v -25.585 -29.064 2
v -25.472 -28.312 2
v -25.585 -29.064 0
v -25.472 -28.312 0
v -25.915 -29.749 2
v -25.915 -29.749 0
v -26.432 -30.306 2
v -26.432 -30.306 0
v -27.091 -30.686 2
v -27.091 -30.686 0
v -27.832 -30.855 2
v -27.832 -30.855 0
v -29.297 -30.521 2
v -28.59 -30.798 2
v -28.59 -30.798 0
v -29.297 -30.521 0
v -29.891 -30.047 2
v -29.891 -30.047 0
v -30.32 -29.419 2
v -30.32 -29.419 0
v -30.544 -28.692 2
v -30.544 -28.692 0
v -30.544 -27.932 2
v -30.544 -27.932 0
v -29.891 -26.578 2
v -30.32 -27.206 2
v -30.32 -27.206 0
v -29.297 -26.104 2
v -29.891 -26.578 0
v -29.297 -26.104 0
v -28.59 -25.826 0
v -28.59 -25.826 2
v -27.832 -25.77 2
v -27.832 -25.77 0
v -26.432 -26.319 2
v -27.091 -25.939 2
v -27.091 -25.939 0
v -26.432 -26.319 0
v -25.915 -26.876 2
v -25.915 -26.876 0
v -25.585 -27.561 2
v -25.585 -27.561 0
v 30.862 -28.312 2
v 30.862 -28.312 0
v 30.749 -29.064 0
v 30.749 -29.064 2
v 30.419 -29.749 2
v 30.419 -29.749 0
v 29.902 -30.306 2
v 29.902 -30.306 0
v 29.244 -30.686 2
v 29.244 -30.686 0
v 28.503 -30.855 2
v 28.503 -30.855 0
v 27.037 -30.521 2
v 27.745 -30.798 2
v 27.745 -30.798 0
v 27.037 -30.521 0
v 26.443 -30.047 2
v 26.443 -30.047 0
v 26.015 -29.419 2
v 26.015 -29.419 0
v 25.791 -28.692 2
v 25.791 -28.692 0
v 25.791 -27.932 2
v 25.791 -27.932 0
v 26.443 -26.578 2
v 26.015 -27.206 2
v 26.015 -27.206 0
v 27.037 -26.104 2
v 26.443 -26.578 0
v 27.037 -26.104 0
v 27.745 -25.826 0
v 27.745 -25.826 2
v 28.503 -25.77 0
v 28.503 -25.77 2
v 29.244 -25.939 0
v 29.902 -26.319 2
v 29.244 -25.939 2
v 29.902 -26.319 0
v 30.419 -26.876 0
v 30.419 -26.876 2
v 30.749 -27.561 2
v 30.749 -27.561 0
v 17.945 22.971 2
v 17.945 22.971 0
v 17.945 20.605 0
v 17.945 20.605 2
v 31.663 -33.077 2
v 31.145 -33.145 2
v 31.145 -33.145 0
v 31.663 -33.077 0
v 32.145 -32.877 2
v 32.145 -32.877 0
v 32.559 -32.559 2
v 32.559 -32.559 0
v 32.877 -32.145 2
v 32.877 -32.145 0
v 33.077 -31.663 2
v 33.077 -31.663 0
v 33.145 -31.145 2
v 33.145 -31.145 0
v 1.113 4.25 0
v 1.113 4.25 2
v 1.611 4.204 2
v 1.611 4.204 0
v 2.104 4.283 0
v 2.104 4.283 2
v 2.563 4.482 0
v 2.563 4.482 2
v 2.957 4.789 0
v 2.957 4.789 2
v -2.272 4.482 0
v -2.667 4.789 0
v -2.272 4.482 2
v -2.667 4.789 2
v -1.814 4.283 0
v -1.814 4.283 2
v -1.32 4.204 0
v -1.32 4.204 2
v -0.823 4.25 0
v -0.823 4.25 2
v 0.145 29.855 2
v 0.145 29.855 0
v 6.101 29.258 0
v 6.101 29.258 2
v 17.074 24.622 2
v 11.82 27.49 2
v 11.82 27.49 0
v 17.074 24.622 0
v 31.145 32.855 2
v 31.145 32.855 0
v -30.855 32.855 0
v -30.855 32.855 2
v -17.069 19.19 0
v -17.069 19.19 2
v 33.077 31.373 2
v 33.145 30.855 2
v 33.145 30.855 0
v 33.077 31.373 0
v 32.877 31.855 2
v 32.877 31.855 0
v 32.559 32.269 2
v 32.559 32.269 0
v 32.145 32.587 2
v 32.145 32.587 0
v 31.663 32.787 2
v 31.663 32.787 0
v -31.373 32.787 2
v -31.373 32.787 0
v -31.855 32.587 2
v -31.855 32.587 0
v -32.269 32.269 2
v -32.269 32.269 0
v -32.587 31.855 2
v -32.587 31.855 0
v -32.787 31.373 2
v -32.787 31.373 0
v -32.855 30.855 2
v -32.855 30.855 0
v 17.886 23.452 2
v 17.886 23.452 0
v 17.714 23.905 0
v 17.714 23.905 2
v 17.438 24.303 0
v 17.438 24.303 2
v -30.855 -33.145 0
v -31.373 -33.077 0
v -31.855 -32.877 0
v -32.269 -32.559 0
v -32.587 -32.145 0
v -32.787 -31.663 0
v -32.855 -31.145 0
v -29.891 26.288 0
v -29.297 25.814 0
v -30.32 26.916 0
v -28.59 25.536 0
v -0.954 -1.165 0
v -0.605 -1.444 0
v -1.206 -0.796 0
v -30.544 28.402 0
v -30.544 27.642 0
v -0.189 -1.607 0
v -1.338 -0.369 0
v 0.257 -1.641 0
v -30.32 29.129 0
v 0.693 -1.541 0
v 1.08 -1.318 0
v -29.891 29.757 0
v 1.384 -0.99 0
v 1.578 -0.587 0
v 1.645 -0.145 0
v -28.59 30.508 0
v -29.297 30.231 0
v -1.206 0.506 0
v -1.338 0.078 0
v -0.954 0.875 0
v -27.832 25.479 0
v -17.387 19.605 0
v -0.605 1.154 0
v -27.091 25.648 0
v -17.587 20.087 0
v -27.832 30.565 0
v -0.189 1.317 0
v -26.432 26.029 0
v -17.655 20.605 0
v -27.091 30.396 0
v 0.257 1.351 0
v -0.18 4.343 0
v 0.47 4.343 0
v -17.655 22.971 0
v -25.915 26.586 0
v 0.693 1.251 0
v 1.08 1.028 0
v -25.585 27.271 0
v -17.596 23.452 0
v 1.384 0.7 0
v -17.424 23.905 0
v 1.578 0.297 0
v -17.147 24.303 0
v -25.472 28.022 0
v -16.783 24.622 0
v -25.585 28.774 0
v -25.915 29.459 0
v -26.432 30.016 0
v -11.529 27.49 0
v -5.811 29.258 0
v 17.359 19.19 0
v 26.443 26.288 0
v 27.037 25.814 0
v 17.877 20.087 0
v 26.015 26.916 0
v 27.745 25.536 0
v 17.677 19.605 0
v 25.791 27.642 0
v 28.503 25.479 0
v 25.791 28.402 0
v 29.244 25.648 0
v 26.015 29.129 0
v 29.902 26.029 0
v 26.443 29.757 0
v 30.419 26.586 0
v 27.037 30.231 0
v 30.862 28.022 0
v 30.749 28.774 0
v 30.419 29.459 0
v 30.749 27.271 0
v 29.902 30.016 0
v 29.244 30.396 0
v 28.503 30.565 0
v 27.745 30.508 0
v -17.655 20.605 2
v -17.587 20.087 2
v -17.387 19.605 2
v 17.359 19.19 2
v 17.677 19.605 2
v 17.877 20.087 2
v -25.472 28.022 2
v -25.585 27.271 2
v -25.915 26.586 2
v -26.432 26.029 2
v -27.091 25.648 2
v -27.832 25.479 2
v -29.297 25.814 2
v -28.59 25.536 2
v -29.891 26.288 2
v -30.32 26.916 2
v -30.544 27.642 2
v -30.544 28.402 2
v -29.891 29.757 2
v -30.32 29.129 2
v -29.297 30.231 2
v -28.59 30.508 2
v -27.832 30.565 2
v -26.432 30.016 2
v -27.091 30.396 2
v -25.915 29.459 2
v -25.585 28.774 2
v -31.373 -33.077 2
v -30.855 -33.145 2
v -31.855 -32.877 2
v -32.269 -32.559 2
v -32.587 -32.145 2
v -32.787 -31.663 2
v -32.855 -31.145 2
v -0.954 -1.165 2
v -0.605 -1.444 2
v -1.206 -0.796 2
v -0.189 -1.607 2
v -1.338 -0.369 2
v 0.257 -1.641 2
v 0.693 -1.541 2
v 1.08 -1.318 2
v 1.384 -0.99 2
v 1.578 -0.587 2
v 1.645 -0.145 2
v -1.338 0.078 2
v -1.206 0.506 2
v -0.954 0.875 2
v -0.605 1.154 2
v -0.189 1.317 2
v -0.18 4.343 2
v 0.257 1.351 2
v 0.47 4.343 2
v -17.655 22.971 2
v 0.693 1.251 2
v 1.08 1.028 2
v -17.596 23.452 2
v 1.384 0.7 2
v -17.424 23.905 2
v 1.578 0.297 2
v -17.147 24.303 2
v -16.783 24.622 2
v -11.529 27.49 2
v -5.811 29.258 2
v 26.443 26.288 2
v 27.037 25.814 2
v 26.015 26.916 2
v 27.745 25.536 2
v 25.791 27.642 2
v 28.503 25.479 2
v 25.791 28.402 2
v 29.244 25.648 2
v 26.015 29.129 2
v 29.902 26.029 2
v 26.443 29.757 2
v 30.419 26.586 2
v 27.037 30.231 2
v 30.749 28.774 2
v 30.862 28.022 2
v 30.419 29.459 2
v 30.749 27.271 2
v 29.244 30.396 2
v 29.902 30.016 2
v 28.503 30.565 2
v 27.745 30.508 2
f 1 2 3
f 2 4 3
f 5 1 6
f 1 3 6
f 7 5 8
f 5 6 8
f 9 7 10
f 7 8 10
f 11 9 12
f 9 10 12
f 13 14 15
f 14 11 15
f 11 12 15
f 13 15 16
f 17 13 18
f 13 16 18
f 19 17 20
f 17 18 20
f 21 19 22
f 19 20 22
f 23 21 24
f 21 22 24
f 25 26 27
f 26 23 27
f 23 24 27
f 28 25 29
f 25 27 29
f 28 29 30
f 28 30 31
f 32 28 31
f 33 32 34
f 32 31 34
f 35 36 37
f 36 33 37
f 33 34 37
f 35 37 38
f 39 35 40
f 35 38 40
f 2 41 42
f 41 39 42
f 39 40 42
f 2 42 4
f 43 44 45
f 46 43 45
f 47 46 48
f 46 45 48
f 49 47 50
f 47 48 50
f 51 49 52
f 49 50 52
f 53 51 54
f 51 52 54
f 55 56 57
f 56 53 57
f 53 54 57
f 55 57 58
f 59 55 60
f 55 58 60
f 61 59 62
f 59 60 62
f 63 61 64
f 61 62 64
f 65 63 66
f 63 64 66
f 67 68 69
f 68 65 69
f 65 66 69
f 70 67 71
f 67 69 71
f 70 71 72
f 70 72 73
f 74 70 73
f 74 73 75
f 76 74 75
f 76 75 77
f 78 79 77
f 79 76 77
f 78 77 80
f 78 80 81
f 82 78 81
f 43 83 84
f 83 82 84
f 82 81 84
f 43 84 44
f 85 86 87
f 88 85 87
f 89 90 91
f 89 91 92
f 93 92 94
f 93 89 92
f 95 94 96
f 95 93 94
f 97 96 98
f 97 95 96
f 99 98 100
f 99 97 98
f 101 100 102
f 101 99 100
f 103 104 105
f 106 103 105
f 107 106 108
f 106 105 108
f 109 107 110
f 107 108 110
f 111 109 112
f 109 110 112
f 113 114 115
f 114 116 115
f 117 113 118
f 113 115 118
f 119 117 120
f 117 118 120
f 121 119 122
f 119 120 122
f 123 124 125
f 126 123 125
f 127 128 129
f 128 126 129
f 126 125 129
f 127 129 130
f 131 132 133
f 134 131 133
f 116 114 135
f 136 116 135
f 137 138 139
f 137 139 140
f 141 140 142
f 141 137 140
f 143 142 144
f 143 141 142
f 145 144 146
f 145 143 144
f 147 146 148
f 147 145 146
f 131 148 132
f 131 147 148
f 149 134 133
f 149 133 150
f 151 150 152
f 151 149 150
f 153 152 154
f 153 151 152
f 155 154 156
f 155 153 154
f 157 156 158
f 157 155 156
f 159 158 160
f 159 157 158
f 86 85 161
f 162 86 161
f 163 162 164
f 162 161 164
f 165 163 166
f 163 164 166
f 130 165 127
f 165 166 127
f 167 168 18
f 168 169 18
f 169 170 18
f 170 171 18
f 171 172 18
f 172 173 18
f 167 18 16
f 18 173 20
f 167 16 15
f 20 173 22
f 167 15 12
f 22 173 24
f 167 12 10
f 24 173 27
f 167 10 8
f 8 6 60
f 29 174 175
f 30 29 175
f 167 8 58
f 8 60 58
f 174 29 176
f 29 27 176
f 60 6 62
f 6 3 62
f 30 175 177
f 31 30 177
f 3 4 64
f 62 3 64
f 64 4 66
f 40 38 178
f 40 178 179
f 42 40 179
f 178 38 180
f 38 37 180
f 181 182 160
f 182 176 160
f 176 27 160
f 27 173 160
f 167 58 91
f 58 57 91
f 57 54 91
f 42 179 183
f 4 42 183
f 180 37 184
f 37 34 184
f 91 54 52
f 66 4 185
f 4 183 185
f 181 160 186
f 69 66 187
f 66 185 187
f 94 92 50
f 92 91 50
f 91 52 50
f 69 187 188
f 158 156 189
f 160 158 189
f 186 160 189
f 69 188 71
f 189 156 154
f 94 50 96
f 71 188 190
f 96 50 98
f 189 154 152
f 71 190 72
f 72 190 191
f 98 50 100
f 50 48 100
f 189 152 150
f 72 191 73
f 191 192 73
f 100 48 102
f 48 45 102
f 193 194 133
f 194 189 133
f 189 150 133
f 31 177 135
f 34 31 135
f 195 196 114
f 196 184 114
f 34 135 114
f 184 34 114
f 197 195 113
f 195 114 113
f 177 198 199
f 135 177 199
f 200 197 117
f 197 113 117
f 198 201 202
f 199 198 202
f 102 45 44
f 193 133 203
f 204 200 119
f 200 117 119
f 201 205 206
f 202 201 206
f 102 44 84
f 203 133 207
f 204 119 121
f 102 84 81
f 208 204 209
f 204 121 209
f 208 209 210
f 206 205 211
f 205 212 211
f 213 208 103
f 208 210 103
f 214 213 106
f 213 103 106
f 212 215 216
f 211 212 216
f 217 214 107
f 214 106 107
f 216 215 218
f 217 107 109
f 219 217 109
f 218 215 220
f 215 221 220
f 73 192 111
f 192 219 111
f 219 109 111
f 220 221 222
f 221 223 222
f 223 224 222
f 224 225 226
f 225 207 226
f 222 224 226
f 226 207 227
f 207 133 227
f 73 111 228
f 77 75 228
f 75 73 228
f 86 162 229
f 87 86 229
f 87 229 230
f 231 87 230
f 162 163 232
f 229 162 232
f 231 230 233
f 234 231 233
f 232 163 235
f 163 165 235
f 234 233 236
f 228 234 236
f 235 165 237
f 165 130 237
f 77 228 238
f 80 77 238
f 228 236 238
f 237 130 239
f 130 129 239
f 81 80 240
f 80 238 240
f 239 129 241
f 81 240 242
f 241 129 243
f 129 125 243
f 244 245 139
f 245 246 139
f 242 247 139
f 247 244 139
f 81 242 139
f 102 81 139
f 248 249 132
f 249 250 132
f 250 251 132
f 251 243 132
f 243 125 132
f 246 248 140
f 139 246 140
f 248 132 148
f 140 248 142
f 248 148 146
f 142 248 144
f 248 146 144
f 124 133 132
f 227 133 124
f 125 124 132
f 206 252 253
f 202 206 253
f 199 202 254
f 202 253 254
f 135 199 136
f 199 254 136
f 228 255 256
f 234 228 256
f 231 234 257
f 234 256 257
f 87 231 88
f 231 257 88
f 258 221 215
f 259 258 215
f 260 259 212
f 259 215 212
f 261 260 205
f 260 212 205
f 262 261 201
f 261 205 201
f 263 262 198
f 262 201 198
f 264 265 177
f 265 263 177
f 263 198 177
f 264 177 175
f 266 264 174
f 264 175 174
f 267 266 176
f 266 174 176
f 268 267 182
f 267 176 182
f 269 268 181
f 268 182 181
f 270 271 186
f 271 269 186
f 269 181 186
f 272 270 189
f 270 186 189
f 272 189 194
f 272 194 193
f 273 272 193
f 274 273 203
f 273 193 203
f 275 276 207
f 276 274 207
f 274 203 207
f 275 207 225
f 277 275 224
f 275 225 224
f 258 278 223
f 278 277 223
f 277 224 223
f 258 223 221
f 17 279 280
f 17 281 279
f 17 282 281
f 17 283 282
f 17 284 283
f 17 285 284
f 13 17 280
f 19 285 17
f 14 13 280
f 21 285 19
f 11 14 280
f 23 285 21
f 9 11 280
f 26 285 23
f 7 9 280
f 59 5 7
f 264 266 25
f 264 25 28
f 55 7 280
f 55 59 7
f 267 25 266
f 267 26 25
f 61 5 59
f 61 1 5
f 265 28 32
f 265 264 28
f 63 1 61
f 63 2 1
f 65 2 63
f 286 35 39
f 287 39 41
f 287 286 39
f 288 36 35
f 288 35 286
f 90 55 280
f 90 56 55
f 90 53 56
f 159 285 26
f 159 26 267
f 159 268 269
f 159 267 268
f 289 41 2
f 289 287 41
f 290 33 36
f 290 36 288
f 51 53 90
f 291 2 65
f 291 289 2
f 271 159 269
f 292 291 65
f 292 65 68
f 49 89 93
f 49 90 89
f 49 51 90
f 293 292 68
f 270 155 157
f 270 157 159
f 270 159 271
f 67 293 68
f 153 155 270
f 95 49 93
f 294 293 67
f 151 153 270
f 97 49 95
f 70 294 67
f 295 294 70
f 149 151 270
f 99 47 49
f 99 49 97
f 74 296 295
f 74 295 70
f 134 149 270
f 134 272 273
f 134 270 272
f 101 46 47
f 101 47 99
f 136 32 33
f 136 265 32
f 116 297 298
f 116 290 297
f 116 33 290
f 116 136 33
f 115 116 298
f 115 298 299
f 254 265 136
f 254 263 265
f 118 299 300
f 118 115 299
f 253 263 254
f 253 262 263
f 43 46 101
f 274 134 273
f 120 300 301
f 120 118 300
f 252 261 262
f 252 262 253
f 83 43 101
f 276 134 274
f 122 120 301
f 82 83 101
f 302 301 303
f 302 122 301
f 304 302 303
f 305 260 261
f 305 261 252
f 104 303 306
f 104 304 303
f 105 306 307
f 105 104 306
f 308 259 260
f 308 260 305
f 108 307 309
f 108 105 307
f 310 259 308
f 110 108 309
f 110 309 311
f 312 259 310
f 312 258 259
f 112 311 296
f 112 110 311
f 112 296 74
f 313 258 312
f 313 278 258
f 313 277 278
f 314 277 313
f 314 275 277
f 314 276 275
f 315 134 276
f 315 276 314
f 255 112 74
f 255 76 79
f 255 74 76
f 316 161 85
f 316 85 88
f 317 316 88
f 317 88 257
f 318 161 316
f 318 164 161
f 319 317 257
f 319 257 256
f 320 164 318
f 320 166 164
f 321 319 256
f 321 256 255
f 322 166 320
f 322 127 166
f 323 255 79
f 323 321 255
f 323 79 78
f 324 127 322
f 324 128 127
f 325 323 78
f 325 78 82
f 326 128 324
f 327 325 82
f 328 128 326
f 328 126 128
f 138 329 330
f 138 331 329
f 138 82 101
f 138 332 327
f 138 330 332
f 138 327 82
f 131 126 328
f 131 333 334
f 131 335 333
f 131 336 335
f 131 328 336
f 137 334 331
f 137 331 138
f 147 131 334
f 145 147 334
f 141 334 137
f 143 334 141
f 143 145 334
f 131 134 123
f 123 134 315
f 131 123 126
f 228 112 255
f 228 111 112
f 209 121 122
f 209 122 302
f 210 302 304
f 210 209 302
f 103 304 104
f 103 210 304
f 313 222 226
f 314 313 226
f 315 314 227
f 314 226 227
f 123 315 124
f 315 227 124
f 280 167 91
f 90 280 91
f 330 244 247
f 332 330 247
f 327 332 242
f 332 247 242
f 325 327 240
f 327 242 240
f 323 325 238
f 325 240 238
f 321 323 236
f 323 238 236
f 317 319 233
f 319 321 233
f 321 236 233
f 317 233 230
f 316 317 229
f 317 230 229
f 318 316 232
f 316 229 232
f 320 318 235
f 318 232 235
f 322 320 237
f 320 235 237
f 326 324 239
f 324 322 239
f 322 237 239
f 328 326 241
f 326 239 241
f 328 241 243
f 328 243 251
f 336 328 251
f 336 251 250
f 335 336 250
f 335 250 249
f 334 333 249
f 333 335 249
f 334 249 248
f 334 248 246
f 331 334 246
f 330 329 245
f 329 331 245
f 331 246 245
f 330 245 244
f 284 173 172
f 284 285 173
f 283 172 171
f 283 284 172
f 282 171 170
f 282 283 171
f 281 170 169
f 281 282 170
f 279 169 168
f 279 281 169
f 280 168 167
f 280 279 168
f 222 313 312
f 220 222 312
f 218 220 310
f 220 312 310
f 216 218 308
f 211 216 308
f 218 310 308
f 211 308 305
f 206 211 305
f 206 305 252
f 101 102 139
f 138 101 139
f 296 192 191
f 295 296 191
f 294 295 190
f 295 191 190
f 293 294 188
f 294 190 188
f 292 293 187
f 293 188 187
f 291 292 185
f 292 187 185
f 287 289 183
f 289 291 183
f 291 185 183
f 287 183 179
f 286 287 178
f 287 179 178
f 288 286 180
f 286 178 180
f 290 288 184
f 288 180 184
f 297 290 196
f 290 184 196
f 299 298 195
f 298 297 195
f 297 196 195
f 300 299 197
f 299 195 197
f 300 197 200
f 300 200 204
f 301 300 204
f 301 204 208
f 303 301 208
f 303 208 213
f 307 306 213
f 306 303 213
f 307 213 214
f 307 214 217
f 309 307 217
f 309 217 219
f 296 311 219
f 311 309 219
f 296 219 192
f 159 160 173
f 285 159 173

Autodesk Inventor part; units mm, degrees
ref_plane "YZ Plane" through (0, 0, 0) normal (1, 0, 0) x (0, 1, 0)
ref_plane "XZ Plane" through (0, 0, 0) normal (0, 1, 0) x (-1, 0, 0)
ref_plane "XY Plane" through (0, 0, 0) normal (0, 0, 1) x (1, 0, 0)
sketch "Sketch1" plane through (0.1451, -0.1451, 0) normal (0, 0, 1) x (1, 0, 0)
  arc A0 (20.126, -22.2473) -> (-20.126, -22.2473) centre (0, 0) ccw construction
  circle A1 centre (0, 0) radius 33 construction
  line L0 (33, 33) -> (-33, 33)
  line L1 (-33, 33) -> (-33, -33)
  line L2 (-33, -33) -> (33, -33)
  line L3 (33, -33) -> (33, 33)
  line L4 (33, 33) -> (23.3345, 23.3345) construction
  line L5 (-33, 33) -> (-23.3345, 23.3345) construction
  line L6 (23.3345, 23.3345) -> (-23.3345, -23.3345) construction
  line L7 (23.3345, -23.3345) -> (33, -33) construction
  line L8 (-23.3345, -23.3345) -> (-33, -33) construction
  line L9 (-23.3345, 23.3345) -> (23.3345, -23.3345) construction
  line L10 (0, -33) -> (0, 33) construction
  line L11 (33, 0) -> (-33, 0) construction
  circle A2 centre (0, 0) radius 1.5
  circle A3 centre (0, 0) radius 4.5
  line L12 (4.0607, -1.9393) -> (22.2473, -20.126) construction
  line L13 (1.9393, -4.0607) -> (17.8, -19.9213) construction
  arc A4 (0, -30) -> (17.8, -24.1487) centre (0, 0) ccw construction
  line L14 (-1.9393, -4.0607) -> (-17.8, -19.9213) construction
  line L15 (-4.0607, -1.9393) -> (-22.2473, -20.126) construction
  line L16 (23.3345, 23.3345) -> (-23.3345, -23.3345) construction
  arc A5 (-20.126, -22.2473) -> (-17.8, -24.1487) centre (0, 0) ccw construction
  line L17 (17.8, -24.1487) -> (17.8, -19.9213) construction
  line L18 (-17.8, -24.1487) -> (-17.8, -19.9213) construction
  line L19 (17.8, -22.035) -> (-17.8, -22.035) construction
  arc A6 (-17.8, -24.1487) -> (0, -30) centre (0, 0) ccw construction
  line L20 (-17.8, -19.9213) -> (-20.126, -22.2473) construction
  line L21 (17.8, -19.9213) -> (20.126, -22.2473) construction
  arc A7 (17.8, -24.1487) -> (20.126, -22.2473) centre (0, 0) ccw construction
  line L22 (17.8, 19.9213) -> (20.126, 22.2473) construction
  arc A8 (20.126, 22.2473) -> (17.8, 24.1487) centre (0, 0) ccw construction
  arc A9 (-17.8, 24.1487) -> (-20.126, 22.2473) centre (0, 0) ccw construction
  line L23 (-17.8, 19.9213) -> (-20.126, 22.2473) construction
  line L24 (-1.9393, 4.0607) -> (-17.8, 19.9213)
  line L25 (1.9393, 4.0607) -> (17.8, 19.9213)
  line L26 (17.8, 24.1487) -> (17.8, 19.9213)
  arc A10 (17.8, 24.1487) -> (0, 30) centre (0, 0) ccw
  arc A11 (0, 30) -> (-17.8, 24.1487) centre (0, 0) ccw
  line L27 (-17.8, 24.1487) -> (-17.8, 19.9213)
  circle A12 centre (28.1673, -28.1673) radius 2.55
  circle A13 centre (-28.1673, -28.1673) radius 2.55
  circle A14 centre (-28.1673, 28.1673) radius 2.55
  circle A15 centre (28.1673, 28.1673) radius 2.55
  point P0 (0, -22.035)
  dimension "d17" = 60
  dimension "d18" = 3
  dimension "d19" = 3
  dimension "d20" = 3
  dimension "d21" = 1.5
  dimension "d22" = 3
  dimension "d23" = 35.6
  dimension "d24" = 5.1
  dimension "d25" = 5.1
  dimension "d26" = 5.1
  dimension "d27" = 5.1
extrude "Extrusion1" add sketch "Sketch1" along normal blind 2 contours L3 L2 L1 L0 | A3
fillet "Fillet3" radius 2 10 edges at (17.9451, 24.0036, 1) (17.9451, 19.7762, 1) (33.1451, 32.8549, 1) (-32.8549, 32.8549, 1) (2.0845, 3.9155, 1) (-1.7942, 3.9155, 1) (-17.6549, 24.0036, 1) (-17.6549, 19.7762, 1) (33.1451, -33.1451, 1) (-32.8549, -33.1451, 1)
ref_plane "Work Plane4" through (-30.8549, -0.1451, 0) normal (0, -1, 0) x (1, 0, 0)
ref_plane "Work Plane5" through (0.1451, -31.1451, 0) normal (1, 0, 0) x (0, 0, -1)
properties part number "Feeder Top Plate" material "Aluminum 6061"
